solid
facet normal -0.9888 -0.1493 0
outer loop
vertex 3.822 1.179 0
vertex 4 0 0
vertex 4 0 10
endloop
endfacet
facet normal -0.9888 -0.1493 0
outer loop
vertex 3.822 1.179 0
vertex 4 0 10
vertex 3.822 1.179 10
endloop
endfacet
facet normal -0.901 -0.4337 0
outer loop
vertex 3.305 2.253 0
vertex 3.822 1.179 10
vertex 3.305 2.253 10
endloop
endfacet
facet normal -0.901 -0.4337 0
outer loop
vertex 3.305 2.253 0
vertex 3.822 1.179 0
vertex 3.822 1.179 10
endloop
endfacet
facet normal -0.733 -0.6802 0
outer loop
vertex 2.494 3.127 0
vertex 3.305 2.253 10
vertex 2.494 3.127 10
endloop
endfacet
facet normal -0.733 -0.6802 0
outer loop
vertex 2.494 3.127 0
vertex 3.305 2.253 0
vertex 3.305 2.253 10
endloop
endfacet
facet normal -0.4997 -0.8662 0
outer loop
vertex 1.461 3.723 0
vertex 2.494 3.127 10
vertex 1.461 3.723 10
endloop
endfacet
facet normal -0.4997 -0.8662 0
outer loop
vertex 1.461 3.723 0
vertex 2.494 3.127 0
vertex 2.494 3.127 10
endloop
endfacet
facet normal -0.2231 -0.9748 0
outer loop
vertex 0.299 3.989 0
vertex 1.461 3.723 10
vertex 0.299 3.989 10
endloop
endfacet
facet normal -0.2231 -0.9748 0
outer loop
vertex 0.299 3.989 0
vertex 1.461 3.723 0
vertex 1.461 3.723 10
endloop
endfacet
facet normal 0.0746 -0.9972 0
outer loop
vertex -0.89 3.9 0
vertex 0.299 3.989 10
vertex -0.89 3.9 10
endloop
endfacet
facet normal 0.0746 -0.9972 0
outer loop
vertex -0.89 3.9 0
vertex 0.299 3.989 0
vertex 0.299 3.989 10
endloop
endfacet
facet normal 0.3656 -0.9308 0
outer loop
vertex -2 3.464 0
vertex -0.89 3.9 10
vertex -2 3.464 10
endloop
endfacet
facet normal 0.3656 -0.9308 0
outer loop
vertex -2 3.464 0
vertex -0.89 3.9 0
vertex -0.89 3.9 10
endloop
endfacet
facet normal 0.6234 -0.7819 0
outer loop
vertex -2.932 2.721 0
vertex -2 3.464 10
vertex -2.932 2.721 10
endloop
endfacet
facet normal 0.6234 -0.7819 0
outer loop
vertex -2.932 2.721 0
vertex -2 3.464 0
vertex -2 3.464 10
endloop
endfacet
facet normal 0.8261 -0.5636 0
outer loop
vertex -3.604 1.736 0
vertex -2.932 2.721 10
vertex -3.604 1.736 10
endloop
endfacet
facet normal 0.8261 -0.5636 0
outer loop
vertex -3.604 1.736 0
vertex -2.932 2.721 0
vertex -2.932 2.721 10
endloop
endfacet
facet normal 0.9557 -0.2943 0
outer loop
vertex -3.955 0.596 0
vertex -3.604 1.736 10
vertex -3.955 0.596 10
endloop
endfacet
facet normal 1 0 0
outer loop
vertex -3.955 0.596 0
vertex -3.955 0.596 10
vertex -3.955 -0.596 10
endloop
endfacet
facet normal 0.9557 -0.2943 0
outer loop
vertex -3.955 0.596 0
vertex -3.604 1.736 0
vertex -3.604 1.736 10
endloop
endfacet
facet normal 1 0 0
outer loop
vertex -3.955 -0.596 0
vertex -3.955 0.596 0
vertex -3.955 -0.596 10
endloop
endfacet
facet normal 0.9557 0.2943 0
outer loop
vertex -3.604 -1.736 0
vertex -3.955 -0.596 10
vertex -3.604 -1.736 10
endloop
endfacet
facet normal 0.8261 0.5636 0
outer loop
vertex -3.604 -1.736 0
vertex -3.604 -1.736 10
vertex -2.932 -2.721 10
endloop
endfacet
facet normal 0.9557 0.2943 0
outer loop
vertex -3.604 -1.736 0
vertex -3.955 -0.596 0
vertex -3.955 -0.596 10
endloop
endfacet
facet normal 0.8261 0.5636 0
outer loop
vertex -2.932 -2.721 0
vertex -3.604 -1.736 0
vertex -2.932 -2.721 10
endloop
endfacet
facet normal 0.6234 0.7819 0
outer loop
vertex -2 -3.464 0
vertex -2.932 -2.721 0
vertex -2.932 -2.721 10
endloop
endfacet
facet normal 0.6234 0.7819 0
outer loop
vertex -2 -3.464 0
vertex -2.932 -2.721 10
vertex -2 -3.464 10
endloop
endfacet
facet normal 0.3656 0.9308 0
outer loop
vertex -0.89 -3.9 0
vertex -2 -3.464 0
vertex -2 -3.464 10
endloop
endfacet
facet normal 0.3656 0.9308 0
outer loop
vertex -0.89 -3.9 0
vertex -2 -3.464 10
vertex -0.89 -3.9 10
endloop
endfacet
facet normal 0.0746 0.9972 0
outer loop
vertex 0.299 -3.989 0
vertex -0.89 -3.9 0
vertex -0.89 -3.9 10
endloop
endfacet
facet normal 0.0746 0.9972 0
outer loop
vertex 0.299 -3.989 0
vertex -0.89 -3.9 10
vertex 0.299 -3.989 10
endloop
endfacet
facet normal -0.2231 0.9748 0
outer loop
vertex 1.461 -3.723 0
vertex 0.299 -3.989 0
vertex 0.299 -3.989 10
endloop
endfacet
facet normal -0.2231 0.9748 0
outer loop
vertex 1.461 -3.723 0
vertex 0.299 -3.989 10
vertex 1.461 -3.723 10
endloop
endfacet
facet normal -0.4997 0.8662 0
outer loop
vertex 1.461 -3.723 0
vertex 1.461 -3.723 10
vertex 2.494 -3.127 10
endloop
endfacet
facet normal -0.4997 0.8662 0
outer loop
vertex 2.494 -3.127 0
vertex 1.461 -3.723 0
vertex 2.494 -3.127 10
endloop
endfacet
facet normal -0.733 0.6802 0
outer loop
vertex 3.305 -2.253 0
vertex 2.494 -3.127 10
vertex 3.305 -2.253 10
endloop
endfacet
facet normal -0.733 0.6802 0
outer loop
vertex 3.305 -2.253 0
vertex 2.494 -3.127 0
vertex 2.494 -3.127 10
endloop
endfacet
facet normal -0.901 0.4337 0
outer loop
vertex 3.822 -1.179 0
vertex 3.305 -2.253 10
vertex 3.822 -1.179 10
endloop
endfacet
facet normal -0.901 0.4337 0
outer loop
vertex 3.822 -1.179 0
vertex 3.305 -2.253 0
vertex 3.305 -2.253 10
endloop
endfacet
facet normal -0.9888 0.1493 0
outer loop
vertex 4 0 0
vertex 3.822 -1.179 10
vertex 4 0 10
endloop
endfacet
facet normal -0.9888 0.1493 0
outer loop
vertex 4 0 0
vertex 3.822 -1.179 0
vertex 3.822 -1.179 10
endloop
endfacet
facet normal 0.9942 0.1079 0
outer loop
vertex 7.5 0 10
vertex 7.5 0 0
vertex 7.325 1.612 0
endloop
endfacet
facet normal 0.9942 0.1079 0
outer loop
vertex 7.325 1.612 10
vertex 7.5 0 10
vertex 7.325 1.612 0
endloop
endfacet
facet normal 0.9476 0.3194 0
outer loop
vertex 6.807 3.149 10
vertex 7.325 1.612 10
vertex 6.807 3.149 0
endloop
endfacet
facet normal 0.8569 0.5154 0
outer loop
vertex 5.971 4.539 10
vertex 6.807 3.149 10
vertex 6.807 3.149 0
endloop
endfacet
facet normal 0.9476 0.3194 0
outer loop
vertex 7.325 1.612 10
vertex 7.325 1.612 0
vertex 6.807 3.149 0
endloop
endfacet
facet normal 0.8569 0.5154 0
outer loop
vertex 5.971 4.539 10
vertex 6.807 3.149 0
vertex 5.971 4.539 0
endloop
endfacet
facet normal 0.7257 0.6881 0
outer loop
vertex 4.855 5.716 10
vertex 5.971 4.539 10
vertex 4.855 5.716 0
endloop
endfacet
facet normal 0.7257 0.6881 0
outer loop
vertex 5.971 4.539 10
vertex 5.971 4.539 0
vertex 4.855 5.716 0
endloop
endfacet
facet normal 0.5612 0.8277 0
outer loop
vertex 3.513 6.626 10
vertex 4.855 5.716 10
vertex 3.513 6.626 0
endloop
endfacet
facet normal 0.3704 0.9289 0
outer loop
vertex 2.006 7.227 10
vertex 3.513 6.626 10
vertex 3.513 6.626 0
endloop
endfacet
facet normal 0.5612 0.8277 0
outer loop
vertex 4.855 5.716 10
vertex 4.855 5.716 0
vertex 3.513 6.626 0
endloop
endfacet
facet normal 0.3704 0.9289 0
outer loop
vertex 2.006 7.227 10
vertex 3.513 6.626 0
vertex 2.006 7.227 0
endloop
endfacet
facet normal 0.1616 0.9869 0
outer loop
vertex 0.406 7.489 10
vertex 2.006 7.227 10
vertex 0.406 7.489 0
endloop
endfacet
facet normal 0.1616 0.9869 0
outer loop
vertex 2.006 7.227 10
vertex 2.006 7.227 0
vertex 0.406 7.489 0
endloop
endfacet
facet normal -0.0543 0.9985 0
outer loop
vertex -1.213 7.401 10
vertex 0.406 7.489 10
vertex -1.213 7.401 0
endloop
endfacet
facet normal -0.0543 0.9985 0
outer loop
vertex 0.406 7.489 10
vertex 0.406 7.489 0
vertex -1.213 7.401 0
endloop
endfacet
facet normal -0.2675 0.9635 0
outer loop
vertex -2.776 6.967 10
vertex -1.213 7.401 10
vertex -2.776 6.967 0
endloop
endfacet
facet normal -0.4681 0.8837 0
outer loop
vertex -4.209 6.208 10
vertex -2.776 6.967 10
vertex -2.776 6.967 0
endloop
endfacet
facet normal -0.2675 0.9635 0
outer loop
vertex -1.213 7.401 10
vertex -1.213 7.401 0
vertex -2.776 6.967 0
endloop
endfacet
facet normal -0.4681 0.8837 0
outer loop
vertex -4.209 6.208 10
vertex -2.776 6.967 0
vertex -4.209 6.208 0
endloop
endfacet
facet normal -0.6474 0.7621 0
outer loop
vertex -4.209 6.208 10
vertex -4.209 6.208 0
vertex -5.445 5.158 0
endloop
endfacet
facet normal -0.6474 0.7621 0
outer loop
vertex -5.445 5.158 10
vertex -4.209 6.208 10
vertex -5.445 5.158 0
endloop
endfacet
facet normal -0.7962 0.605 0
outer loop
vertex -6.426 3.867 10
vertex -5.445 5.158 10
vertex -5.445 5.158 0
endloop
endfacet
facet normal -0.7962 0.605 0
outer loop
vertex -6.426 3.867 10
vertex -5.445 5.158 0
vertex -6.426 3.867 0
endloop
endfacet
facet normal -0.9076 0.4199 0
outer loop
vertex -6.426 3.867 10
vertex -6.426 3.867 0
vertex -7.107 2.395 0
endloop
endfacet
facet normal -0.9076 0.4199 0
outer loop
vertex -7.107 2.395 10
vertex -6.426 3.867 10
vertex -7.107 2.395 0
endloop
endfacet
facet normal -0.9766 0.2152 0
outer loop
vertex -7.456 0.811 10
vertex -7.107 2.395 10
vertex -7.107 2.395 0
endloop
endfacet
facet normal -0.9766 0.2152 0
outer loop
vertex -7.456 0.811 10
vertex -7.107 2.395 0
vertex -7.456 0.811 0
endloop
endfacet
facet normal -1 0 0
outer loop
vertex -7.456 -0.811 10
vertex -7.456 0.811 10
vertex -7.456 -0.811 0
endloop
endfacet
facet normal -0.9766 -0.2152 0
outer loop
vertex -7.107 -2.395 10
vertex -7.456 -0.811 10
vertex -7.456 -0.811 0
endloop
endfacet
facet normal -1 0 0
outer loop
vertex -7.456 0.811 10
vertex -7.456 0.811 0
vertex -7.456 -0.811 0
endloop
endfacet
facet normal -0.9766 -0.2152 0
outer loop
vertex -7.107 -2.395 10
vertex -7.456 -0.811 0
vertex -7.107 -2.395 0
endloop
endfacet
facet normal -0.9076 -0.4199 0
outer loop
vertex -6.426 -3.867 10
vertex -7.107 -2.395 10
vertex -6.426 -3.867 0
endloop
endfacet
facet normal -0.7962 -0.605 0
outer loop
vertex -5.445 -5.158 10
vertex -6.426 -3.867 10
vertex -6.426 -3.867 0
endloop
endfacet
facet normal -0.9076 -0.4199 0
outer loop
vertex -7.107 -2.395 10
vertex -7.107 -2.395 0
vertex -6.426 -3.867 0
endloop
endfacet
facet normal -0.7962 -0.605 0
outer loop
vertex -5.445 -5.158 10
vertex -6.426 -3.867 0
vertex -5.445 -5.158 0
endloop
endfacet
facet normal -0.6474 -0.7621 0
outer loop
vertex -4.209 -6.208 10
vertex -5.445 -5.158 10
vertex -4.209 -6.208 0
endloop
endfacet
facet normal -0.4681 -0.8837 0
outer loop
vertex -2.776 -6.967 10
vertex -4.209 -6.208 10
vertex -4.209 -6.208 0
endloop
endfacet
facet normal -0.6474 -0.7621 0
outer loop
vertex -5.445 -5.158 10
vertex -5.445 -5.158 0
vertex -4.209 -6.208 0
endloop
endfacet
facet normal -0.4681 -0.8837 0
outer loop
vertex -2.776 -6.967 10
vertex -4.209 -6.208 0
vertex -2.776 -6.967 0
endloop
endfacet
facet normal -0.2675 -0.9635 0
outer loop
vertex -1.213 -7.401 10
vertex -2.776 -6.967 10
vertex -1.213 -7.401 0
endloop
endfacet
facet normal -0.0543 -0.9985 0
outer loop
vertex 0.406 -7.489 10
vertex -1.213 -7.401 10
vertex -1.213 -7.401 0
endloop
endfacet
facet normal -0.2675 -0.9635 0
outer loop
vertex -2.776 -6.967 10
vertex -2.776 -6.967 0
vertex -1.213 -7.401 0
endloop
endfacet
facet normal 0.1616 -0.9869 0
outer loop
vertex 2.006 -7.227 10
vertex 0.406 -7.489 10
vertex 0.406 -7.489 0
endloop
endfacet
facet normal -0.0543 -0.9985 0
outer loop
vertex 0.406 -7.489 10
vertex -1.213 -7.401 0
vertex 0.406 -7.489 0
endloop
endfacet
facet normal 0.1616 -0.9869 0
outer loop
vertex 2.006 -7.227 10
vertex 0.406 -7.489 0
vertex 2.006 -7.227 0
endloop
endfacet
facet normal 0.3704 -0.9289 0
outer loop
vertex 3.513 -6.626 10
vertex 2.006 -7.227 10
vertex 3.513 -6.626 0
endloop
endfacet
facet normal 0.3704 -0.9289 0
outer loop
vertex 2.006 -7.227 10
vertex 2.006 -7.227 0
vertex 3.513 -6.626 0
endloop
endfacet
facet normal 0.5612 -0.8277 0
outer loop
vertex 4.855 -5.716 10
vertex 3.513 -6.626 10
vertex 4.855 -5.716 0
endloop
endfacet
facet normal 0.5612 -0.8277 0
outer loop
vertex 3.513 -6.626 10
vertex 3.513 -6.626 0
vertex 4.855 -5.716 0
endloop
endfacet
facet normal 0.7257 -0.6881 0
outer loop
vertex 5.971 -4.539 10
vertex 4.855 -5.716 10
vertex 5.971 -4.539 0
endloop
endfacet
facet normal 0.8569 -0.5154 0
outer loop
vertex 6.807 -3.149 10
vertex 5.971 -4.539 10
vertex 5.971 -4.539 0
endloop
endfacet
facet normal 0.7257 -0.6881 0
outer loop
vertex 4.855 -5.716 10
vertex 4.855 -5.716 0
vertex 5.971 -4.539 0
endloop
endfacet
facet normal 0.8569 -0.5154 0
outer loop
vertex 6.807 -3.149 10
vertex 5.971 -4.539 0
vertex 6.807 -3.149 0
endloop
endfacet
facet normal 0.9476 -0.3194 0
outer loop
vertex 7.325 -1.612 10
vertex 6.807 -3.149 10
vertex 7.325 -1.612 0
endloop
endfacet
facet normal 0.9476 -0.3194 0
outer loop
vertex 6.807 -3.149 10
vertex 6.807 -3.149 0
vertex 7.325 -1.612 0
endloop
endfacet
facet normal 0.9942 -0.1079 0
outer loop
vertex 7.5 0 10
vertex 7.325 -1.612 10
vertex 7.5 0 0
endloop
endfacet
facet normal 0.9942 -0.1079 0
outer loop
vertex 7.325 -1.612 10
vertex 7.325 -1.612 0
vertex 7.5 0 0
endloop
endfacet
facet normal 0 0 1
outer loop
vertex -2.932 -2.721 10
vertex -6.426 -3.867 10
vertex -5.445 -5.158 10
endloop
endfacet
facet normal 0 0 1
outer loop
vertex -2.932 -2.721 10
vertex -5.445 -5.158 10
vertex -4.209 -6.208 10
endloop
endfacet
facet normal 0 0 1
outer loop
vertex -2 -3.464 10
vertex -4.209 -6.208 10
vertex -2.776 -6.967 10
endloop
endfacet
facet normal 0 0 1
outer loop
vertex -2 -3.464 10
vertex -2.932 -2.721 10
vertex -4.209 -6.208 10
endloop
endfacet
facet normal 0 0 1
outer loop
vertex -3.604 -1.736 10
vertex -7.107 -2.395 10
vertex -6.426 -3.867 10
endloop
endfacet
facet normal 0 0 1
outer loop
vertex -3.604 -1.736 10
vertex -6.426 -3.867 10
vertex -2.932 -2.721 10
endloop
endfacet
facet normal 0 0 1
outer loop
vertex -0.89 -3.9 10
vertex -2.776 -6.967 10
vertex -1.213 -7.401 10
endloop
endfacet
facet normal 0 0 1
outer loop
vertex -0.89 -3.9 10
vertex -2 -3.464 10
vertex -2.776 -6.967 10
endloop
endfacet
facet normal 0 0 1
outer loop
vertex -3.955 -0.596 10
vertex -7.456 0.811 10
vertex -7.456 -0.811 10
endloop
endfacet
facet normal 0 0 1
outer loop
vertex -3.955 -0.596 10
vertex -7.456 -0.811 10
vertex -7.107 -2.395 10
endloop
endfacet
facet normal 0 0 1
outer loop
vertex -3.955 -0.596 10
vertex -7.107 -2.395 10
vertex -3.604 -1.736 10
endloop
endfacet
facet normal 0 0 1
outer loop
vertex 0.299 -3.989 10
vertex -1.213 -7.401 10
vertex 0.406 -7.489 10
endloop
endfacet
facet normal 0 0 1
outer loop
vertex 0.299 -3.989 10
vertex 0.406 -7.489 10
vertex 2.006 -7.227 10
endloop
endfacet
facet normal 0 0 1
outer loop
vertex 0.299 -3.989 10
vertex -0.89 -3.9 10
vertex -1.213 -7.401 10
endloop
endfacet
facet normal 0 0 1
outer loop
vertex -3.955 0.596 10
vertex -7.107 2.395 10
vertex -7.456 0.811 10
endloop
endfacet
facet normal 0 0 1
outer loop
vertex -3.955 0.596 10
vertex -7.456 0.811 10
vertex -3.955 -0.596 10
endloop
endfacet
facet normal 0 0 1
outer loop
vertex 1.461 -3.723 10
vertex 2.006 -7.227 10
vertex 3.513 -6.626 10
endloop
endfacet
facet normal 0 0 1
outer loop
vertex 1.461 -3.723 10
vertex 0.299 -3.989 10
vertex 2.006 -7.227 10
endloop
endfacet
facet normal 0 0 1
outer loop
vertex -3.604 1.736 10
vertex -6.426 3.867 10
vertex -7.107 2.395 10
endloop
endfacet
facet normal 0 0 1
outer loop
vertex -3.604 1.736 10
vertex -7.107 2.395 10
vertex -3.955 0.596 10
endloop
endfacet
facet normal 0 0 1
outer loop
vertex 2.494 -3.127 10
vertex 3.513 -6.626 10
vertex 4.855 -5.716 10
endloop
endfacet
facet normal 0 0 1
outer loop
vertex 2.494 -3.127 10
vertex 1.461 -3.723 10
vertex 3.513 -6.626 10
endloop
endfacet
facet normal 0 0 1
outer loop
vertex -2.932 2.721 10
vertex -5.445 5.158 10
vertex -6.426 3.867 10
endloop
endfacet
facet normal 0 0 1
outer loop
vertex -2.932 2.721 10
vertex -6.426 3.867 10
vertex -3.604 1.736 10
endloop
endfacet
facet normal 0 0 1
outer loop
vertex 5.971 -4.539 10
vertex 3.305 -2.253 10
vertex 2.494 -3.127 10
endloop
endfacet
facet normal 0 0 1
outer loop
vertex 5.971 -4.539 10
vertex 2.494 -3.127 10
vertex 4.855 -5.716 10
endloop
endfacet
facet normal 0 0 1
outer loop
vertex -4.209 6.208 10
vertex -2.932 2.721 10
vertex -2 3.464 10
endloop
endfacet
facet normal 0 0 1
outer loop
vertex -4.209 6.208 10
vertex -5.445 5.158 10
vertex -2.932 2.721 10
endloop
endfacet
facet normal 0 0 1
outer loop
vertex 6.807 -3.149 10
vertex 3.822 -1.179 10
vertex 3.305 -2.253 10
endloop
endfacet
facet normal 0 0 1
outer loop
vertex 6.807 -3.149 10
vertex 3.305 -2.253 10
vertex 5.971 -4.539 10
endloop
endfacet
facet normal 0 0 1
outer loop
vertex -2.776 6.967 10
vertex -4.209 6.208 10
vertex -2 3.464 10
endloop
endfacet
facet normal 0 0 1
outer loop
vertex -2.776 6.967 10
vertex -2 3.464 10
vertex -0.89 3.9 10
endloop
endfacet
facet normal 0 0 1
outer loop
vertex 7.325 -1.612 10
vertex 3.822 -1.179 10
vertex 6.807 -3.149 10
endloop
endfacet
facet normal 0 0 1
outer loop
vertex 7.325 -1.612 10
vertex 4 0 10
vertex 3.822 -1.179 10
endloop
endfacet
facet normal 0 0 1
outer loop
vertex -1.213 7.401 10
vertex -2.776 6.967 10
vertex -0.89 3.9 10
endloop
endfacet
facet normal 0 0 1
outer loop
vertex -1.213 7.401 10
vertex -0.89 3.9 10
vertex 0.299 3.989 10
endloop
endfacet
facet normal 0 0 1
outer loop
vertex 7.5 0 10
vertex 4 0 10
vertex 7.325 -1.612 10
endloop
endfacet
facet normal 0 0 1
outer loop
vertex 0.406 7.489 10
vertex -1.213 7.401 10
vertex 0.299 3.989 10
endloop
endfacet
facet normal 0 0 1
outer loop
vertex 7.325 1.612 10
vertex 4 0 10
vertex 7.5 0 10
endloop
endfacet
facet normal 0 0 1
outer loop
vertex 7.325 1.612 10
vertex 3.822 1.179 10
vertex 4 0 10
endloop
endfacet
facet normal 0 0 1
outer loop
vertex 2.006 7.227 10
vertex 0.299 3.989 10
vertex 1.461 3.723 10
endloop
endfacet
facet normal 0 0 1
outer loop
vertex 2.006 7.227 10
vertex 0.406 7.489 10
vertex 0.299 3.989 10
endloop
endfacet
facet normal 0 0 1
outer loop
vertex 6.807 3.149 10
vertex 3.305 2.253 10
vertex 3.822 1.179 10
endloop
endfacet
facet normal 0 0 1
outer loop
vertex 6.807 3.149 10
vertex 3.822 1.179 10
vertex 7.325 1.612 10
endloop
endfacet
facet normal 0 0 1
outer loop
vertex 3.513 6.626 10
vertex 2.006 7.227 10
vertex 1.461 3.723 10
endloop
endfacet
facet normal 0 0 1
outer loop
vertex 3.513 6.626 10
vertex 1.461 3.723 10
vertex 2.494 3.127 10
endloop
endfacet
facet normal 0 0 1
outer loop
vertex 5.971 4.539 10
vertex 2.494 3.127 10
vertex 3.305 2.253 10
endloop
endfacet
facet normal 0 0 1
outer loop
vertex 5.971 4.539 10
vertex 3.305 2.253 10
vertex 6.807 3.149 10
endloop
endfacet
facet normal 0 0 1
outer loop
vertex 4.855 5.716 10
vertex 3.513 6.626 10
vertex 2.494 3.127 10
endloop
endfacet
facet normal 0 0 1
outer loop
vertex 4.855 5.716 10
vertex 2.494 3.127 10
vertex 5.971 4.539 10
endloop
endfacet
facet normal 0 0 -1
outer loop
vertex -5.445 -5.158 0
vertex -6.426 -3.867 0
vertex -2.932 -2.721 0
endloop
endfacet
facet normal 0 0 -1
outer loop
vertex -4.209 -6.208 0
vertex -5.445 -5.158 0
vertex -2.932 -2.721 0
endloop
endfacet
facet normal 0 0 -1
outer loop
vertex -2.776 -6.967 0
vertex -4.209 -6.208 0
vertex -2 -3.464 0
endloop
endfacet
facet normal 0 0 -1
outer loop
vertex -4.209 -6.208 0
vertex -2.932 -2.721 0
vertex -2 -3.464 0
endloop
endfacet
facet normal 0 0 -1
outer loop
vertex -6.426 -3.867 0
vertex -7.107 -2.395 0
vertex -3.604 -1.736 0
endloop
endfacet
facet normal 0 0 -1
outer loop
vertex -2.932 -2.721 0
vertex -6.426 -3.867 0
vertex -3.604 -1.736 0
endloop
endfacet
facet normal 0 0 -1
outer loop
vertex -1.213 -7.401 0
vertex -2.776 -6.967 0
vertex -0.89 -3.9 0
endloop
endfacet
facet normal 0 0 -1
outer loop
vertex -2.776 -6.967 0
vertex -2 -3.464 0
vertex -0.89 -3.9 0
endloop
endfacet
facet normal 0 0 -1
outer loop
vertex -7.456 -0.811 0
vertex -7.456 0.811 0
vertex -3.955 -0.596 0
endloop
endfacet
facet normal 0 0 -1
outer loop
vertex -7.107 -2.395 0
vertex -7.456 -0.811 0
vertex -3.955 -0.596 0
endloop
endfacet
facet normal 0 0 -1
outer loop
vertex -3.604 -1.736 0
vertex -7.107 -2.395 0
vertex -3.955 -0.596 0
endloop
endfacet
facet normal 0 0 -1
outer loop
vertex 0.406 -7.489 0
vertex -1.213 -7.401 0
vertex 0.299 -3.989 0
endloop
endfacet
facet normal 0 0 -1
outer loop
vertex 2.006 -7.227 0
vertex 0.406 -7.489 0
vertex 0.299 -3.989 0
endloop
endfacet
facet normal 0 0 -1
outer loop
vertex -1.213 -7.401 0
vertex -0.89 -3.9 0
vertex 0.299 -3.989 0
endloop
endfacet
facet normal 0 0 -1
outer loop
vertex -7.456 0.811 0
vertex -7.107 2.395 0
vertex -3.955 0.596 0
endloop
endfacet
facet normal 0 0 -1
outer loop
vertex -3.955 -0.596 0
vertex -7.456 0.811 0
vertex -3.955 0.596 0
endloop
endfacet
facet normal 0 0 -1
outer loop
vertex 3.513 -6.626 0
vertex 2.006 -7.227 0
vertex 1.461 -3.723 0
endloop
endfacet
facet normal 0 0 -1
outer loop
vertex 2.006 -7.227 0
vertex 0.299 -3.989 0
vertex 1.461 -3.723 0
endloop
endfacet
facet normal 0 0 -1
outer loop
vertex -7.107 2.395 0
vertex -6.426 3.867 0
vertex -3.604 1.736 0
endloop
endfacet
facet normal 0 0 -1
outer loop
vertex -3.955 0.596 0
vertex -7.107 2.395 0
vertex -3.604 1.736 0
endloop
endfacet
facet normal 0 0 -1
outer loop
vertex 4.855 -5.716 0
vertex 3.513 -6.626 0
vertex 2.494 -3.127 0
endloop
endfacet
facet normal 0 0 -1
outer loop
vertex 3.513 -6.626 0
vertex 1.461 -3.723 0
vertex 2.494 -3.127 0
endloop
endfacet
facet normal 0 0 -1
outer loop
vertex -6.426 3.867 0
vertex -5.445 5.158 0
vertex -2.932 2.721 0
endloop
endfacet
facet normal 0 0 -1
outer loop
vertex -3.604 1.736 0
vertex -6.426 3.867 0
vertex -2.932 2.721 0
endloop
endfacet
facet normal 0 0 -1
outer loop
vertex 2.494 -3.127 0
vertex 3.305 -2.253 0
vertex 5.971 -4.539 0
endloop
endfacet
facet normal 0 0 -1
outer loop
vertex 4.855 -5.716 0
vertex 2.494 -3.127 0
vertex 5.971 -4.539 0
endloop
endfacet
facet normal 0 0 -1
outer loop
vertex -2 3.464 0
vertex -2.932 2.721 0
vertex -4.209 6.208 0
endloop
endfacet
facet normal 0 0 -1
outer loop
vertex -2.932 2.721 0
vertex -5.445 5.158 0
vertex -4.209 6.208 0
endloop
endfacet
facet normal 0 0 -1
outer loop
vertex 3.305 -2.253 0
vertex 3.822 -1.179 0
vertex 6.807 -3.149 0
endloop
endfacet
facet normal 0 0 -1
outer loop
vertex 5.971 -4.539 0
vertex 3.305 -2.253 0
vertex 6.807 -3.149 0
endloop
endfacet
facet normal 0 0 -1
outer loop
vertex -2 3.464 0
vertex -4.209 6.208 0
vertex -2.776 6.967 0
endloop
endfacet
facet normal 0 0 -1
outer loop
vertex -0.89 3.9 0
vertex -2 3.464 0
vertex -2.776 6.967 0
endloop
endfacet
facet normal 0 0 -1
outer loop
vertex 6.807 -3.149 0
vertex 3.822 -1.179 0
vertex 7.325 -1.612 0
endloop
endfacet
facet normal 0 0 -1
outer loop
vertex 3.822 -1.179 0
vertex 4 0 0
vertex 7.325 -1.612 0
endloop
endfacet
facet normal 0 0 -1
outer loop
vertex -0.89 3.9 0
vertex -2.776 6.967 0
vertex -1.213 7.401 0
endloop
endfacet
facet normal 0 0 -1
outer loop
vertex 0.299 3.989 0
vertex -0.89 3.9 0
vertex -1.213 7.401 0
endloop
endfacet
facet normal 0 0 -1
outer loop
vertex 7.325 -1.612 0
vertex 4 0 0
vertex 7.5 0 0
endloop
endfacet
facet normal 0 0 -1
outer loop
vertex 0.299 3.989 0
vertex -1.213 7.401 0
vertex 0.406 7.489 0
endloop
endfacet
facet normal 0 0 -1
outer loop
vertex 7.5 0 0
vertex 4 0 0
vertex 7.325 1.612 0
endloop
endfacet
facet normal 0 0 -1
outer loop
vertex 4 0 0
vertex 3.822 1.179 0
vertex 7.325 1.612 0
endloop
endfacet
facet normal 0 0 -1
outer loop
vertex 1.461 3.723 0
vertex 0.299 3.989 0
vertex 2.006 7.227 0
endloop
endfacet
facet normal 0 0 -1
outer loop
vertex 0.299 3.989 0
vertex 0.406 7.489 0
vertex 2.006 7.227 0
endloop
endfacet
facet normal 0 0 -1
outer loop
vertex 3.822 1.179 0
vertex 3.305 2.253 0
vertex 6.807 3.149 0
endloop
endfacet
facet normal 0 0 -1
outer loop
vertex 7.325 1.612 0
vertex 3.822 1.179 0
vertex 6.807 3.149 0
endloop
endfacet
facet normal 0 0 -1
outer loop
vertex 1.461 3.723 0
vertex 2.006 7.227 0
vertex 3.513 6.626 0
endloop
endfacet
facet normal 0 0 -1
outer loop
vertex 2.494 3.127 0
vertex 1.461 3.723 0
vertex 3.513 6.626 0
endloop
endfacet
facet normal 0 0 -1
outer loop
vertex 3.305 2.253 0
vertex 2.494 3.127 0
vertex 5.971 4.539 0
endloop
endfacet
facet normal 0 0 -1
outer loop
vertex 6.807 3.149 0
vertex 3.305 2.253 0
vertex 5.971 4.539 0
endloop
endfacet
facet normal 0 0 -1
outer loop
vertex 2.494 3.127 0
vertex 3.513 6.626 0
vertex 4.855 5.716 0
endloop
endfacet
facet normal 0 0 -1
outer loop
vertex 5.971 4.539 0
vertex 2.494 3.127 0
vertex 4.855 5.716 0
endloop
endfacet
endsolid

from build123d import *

# Parameters (mm, degrees)
F0_R     = 7.5
F0_R_2   = 4
F1_DEPTH = 10
F2_W     = 30
F2_H     = 1


with BuildPart() as f1:
    # F0 (on Top) → F1 (new body)
    with BuildSketch(Plane.XY):
        Circle(F0_R)
        Circle(F0_R_2, mode=Mode.SUBTRACT)
    extrude(amount=F1_DEPTH)


with BuildPart() as f3:
    # F2 (on Front) → F3 (revolve)
    with BuildSketch(Plane.XZ):
        with Locations((31.168116, 42.156867)):
            Rectangle(F2_W, F2_H)
    revolve(axis=Axis((31.168116, 0, 42.656867), (1, 0, 0)))


solid = f1.part
